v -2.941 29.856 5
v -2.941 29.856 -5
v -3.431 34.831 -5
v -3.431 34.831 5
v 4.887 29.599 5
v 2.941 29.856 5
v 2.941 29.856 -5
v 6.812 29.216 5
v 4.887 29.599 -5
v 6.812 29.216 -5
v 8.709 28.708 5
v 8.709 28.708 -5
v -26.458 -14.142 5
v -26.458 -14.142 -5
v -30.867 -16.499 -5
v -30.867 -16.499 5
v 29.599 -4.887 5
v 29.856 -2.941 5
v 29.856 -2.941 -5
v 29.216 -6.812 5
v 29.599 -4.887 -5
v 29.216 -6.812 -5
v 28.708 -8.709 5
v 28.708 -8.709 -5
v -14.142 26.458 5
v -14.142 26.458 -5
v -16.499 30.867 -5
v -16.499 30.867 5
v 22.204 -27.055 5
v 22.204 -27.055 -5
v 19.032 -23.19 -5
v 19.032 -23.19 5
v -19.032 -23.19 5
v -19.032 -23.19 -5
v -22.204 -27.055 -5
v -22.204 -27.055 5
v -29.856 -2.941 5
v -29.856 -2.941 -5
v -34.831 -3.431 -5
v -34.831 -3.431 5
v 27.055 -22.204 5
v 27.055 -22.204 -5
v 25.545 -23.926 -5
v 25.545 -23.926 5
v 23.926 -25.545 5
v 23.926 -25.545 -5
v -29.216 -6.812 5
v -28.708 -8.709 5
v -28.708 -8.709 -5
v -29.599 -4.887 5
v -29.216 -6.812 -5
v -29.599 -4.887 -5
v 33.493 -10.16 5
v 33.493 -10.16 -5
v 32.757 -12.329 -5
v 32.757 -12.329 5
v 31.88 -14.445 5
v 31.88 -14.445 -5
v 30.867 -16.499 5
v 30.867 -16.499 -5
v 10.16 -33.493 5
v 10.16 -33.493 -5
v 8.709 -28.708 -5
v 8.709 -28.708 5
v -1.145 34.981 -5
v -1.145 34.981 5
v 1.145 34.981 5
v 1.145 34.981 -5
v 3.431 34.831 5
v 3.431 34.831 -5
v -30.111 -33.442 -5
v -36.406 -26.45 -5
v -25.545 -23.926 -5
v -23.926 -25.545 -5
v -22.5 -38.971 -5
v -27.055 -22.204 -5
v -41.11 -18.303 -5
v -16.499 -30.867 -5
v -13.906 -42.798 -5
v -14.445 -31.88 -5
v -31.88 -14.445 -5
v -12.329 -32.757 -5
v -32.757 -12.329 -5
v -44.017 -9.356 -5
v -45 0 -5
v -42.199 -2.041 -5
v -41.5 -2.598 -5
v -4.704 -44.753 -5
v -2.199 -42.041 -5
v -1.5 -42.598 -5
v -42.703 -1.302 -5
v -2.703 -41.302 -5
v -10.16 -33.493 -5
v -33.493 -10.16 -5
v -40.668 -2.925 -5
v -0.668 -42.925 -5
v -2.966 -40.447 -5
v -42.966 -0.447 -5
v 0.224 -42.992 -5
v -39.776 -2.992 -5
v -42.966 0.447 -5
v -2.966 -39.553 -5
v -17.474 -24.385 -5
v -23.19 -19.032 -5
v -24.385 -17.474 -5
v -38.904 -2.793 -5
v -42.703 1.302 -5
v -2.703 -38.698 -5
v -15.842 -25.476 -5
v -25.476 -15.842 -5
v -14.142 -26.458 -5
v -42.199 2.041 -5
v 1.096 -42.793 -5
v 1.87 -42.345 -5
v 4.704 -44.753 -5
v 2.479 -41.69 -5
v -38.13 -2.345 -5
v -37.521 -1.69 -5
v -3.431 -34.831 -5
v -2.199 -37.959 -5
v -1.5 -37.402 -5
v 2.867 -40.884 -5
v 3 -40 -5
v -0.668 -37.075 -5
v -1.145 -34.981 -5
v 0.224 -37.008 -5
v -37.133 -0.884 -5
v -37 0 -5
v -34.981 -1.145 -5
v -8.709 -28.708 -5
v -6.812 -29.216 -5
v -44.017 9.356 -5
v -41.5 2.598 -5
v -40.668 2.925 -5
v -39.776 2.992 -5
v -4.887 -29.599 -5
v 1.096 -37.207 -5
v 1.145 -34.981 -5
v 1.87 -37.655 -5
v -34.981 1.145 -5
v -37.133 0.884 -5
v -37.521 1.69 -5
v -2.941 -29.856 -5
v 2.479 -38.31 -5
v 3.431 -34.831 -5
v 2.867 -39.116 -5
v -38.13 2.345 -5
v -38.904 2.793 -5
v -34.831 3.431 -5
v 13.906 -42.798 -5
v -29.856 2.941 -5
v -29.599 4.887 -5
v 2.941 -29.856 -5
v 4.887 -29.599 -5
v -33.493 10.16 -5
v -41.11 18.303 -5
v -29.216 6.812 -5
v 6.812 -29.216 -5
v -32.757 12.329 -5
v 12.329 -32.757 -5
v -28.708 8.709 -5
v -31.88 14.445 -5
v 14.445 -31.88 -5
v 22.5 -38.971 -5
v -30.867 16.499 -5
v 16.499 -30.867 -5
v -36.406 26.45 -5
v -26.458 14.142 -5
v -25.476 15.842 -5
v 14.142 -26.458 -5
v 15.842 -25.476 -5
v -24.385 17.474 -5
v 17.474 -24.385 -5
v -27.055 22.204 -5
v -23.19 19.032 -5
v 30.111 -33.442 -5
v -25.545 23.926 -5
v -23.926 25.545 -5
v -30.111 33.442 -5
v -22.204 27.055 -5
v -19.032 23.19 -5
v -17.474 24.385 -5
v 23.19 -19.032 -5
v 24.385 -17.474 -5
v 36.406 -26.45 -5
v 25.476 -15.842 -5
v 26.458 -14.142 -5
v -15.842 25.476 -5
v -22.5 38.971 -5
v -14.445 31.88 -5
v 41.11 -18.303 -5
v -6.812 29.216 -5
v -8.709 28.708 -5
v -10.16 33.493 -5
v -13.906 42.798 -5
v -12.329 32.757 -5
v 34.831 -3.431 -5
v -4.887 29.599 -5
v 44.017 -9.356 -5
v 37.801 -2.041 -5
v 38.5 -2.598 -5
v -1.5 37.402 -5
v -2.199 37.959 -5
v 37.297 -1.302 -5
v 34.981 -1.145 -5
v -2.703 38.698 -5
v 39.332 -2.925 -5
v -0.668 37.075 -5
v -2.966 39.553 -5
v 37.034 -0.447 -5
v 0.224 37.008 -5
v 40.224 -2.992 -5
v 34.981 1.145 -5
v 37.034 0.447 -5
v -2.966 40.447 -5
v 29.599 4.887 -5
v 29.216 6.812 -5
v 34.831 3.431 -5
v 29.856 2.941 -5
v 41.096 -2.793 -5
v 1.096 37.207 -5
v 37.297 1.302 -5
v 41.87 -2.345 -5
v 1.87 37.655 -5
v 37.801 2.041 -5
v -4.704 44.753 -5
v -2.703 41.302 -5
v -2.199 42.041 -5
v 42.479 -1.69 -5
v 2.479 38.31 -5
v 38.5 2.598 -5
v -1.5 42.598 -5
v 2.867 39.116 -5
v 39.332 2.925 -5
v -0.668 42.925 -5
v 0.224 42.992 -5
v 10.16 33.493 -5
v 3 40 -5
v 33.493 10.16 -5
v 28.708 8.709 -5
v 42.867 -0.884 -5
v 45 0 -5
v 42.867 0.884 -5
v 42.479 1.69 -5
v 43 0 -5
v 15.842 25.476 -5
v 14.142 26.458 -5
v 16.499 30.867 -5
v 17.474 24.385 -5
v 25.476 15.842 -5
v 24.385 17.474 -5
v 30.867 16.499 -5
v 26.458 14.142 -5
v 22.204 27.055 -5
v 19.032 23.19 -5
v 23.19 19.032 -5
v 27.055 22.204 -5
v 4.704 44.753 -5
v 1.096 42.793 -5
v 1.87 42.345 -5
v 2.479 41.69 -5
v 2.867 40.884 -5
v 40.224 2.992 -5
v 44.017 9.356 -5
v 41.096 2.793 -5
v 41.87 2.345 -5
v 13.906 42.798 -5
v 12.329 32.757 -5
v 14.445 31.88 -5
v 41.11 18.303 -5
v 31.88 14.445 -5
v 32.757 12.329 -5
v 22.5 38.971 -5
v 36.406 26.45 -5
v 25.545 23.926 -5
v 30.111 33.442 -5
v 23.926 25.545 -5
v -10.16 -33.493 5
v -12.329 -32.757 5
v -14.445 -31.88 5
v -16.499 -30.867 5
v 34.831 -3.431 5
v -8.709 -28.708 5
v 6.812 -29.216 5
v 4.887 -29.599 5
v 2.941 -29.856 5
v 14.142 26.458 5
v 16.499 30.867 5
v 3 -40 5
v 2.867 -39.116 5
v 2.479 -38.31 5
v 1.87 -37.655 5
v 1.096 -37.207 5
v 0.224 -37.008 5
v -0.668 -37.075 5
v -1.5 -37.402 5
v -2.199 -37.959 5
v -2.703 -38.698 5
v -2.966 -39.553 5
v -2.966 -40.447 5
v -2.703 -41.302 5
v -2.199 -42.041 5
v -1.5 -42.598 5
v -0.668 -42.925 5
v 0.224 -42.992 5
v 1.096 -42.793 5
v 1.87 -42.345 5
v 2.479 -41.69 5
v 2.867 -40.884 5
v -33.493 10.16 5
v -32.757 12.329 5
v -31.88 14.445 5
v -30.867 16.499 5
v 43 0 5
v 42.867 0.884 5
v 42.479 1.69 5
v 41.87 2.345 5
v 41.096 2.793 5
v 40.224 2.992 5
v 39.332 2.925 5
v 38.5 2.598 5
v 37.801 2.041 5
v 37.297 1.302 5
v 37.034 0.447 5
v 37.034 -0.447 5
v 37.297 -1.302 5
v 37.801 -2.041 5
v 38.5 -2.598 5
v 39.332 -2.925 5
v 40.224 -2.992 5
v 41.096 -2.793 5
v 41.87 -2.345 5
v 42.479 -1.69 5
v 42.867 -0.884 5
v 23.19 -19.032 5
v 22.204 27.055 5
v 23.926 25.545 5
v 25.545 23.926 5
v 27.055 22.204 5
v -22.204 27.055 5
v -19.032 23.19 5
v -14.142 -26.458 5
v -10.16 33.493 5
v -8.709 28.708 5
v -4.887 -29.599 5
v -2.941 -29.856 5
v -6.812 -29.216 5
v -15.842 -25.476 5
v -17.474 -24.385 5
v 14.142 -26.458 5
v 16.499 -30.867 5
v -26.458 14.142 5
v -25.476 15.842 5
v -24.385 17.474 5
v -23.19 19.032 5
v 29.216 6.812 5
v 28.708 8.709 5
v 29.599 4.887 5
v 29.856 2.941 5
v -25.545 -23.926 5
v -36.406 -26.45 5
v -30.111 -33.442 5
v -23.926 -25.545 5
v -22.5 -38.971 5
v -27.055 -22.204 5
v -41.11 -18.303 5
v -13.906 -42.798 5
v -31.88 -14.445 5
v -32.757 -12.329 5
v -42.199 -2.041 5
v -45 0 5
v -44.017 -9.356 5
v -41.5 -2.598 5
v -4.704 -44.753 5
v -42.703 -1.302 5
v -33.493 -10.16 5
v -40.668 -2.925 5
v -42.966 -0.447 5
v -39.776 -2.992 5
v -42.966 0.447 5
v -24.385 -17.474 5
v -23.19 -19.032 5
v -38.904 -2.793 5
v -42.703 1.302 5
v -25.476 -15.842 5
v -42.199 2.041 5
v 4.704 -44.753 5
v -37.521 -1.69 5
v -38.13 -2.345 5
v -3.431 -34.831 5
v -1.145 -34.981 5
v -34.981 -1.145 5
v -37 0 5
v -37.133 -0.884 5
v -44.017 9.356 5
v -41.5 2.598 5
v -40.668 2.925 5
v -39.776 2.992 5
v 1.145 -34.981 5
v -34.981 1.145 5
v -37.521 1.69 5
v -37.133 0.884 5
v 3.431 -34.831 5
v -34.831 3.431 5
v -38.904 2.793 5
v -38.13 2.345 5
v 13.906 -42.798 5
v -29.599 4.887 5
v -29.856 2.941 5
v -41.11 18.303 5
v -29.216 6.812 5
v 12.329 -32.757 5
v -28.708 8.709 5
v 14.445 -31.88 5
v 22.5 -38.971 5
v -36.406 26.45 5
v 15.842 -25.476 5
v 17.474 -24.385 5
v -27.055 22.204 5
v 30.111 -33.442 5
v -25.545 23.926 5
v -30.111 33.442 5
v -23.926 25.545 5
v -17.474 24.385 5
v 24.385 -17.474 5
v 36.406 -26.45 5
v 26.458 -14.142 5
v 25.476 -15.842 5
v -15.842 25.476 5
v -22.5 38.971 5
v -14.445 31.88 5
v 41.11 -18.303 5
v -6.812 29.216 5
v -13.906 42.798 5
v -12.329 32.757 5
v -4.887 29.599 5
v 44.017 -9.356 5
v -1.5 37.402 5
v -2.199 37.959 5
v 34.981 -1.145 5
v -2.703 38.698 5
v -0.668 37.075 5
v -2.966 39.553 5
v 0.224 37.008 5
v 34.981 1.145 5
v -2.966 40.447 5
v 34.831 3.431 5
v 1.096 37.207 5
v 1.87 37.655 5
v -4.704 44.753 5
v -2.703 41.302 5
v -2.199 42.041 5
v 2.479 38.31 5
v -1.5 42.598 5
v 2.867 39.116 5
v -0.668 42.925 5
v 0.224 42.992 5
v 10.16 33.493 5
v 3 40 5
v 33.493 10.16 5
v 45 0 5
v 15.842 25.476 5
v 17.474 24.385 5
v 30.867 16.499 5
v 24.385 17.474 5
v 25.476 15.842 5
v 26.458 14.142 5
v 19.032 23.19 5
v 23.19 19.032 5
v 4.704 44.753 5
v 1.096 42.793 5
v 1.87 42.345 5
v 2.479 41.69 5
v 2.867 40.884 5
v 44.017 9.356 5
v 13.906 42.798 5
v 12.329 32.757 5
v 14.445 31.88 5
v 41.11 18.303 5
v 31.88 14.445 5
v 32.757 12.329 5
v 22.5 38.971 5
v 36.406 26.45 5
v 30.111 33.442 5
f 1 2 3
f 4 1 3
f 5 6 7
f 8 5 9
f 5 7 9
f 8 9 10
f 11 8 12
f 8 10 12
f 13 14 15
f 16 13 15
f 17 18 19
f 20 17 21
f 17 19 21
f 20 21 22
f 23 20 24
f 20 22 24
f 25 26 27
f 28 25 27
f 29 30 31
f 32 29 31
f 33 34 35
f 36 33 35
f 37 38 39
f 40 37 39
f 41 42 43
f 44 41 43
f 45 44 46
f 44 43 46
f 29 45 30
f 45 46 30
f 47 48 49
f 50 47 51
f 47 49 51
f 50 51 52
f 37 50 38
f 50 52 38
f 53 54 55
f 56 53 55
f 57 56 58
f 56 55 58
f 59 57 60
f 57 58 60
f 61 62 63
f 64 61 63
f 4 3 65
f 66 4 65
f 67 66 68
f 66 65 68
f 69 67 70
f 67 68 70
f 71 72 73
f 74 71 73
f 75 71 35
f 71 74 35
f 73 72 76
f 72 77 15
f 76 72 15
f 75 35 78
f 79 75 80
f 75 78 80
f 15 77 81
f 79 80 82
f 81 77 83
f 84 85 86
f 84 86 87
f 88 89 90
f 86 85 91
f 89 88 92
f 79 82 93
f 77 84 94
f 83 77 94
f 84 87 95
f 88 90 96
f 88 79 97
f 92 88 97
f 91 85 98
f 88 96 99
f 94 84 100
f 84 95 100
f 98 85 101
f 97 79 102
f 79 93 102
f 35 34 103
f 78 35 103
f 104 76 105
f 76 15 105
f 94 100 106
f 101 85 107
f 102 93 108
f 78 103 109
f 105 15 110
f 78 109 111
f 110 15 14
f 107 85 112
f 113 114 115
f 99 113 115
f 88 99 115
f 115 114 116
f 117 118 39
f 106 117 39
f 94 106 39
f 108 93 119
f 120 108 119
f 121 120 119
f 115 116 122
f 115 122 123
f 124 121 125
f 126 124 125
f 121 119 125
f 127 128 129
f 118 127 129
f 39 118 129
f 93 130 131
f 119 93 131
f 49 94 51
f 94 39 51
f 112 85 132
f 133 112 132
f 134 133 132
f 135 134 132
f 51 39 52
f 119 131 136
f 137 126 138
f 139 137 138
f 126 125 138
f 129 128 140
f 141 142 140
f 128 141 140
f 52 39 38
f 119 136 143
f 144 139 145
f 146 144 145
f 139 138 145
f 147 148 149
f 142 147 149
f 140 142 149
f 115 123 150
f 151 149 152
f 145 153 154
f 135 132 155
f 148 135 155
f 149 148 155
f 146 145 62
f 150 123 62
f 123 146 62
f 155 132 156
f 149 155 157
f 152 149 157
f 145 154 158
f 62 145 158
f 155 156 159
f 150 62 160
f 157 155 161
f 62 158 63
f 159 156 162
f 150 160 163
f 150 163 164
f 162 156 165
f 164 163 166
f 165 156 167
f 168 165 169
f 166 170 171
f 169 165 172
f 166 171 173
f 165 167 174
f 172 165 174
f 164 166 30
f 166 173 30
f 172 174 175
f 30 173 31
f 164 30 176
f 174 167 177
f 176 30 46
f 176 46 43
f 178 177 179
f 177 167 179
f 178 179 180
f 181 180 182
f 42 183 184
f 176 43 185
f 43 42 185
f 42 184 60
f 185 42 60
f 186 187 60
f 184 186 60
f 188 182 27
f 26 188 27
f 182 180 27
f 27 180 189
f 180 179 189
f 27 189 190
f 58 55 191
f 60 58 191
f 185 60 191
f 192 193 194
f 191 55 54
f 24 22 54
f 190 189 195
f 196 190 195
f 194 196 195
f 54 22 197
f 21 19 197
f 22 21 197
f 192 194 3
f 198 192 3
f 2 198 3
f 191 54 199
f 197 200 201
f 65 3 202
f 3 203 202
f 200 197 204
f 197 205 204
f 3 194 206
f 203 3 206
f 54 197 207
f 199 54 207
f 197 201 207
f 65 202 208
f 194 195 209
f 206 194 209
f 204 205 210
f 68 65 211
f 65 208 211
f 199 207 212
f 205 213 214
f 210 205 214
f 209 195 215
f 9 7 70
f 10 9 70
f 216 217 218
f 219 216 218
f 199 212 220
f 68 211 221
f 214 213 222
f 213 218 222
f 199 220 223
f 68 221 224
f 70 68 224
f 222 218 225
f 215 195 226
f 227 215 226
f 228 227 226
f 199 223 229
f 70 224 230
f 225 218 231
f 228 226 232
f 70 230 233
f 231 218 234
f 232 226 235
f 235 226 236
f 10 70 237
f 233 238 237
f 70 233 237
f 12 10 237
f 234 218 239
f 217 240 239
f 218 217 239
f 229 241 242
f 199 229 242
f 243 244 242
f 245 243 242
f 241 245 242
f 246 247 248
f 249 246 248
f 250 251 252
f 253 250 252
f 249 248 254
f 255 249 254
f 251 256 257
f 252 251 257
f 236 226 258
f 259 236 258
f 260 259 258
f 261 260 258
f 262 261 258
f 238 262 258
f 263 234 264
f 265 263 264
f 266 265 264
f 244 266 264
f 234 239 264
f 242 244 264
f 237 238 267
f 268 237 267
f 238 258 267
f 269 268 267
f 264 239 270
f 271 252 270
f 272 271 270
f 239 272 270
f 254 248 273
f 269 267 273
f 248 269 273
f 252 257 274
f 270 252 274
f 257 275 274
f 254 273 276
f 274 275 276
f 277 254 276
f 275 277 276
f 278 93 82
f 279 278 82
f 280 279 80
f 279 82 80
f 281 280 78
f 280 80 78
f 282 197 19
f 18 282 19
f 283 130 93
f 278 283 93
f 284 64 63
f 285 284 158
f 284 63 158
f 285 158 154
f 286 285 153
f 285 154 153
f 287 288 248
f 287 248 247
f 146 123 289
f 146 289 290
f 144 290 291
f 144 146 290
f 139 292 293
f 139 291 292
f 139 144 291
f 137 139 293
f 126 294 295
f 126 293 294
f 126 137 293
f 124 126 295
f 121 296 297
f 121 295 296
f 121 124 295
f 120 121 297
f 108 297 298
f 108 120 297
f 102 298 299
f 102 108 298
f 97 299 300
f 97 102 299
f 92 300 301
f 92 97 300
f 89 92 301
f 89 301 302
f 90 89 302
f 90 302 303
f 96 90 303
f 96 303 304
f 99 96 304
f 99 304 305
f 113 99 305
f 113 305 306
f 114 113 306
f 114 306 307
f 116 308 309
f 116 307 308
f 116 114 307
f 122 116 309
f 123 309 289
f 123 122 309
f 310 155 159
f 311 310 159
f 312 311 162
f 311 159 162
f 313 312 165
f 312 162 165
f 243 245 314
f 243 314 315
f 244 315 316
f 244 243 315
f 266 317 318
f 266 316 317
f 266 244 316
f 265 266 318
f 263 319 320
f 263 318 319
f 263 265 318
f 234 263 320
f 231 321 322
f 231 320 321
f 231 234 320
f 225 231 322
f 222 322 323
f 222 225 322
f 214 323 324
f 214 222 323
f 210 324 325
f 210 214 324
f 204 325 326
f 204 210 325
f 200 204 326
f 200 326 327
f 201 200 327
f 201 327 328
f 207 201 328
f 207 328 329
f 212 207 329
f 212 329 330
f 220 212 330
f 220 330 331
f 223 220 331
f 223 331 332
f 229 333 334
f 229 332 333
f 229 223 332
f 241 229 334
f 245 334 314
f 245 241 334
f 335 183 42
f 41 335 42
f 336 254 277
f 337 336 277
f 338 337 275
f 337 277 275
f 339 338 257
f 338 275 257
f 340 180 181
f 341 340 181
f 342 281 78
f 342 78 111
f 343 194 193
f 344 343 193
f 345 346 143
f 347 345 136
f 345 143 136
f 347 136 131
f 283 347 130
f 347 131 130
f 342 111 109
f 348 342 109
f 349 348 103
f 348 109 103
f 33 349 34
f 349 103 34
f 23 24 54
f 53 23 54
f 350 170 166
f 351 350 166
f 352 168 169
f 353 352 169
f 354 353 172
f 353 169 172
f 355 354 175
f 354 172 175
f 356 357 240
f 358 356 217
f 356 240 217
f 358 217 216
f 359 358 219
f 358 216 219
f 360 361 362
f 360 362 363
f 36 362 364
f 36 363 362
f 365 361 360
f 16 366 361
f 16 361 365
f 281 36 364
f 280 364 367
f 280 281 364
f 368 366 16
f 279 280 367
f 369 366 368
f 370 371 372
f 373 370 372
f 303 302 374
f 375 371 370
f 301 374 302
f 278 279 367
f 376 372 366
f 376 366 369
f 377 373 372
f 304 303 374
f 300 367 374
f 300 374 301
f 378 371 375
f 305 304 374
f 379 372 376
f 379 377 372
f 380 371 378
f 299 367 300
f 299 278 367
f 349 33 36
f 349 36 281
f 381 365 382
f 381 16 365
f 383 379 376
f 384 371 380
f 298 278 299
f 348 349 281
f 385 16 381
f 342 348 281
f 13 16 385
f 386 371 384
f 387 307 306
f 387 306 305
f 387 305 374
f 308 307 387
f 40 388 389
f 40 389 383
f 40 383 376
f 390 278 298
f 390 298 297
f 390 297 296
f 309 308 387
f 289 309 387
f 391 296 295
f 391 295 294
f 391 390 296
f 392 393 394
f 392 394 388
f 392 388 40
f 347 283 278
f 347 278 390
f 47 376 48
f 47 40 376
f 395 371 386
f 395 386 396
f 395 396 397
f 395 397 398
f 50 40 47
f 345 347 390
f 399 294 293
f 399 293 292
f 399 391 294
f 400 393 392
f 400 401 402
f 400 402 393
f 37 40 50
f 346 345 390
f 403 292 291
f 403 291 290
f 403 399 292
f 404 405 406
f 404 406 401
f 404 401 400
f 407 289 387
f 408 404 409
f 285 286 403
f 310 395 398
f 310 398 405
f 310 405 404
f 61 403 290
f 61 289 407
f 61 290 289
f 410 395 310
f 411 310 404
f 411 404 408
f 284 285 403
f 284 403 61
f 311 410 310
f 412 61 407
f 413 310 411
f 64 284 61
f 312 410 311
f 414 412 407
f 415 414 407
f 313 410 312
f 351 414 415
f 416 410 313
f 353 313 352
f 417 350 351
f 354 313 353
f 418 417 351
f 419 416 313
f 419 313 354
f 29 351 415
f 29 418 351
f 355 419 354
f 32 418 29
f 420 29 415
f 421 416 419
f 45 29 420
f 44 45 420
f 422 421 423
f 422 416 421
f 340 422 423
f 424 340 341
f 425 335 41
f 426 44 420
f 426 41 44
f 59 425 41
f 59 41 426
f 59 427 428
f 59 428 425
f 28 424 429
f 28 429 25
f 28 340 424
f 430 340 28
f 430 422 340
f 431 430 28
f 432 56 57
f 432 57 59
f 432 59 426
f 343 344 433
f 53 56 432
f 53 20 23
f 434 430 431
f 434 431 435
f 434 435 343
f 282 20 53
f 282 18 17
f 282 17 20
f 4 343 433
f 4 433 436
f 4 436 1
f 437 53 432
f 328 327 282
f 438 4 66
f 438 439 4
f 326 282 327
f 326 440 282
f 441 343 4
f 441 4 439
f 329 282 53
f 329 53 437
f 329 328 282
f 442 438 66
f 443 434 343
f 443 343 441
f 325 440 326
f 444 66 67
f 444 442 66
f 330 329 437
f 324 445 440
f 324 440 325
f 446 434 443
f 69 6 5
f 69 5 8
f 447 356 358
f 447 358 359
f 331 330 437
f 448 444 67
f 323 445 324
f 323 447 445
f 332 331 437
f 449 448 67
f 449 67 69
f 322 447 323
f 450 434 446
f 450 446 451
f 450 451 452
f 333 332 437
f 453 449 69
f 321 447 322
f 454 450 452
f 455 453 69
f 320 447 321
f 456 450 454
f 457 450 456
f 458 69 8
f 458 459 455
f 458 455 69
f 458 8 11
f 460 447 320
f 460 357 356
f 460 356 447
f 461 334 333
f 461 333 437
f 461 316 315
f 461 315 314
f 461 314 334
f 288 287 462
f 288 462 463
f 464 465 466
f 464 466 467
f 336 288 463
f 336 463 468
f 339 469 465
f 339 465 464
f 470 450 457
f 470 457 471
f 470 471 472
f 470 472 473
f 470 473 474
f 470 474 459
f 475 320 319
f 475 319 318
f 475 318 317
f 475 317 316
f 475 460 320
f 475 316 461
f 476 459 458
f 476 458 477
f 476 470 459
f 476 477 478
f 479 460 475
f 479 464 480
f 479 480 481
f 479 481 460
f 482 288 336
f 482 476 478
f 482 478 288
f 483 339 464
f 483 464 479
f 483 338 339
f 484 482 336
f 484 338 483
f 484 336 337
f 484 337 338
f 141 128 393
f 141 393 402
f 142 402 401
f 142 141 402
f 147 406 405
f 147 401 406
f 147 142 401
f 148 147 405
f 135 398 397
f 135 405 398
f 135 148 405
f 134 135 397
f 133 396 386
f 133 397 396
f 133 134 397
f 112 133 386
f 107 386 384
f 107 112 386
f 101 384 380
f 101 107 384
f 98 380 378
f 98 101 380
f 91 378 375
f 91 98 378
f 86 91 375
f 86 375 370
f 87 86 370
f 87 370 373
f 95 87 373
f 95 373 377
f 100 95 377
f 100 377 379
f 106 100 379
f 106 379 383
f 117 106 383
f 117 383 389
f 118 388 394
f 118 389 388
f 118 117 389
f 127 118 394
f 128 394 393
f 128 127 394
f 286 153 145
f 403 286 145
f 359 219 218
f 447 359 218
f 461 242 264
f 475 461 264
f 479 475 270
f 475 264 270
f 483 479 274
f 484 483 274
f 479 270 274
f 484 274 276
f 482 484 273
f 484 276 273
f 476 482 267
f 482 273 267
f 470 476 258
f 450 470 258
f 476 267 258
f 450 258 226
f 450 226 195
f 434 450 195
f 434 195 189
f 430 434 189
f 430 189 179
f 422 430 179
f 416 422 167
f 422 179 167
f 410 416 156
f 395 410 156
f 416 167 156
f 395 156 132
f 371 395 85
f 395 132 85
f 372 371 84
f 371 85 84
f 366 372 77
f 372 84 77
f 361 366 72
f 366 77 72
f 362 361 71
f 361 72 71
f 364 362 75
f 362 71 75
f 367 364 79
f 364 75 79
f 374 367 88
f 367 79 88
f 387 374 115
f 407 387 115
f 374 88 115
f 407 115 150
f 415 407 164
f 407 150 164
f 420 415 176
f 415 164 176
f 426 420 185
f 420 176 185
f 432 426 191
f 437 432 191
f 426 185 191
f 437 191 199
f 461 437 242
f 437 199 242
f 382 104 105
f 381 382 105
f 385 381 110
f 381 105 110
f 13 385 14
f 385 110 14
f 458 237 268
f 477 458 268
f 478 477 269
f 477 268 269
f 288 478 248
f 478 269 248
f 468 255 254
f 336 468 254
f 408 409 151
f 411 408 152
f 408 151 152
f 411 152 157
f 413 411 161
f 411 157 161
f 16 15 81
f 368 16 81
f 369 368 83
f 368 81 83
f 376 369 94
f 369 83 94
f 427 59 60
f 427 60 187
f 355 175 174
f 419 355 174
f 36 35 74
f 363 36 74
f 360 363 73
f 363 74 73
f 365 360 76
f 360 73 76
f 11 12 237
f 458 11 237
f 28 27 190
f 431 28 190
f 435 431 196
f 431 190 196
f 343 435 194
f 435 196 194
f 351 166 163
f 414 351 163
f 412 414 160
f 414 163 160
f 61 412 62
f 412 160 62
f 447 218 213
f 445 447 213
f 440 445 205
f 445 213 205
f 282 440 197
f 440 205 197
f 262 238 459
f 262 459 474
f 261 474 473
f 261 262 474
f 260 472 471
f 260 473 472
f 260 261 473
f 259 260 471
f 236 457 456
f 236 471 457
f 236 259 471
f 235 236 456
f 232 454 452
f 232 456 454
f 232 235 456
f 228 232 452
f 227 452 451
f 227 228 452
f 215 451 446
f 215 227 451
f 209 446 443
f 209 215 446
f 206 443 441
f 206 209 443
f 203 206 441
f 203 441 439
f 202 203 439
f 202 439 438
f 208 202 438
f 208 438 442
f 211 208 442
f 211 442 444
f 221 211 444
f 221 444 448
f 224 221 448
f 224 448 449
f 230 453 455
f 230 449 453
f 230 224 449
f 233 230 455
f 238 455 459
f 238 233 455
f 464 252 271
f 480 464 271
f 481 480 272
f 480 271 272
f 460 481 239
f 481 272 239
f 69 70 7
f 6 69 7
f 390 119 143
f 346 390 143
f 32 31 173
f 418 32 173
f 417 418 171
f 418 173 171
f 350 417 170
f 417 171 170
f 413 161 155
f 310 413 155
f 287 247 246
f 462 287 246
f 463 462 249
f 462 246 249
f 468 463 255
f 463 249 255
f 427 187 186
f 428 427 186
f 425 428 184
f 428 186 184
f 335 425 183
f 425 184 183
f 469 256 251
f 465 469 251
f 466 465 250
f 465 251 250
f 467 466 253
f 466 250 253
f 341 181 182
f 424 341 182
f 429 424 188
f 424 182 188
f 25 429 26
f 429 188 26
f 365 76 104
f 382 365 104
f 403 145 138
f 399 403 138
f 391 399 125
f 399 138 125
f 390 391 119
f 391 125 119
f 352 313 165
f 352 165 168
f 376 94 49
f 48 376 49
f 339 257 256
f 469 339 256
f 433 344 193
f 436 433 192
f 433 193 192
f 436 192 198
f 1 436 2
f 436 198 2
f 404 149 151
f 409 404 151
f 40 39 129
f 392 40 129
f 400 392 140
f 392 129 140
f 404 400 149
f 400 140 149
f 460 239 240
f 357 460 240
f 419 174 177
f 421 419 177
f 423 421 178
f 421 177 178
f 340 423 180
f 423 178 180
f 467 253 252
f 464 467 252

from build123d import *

# Parameters (mm, degrees)
EXTRUDE_1_DEPTH          = 5
EXTRUDE_1_DEPTH_BACK     = 5
SKETCH_1_R               = 45
CUT_EXTRUDE_1_DEPTH      = 64.835726674
CUT_EXTRUDE_1_DEPTH_BACK = 64.835726674
SKETCH_2_R               = 3


with BuildPart() as part:
    # 草图1 → 凸台-拉伸1 (new, two sides: drawn at the far end of the back side and taken through both)
    with BuildSketch(Plane.XY.offset(-EXTRUDE_1_DEPTH_BACK)):
        Circle(SKETCH_1_R)
        with BuildLine():
            Line((29.8555418, 2.94051421), (34.831465434, 3.430599912))
            ThreePointArc((34.831465434, 3.430599912), (35, 0), (34.831465434, -3.430599912))
            Line((34.831465434, -3.430599912), (29.8555418, -2.94051421))
            ThreePointArc((29.8555418, -2.94051421), (29.423558412, -5.85270966), (28.708210072, -8.708540318))
            Line((28.708210072, -8.708540318), (33.492911751, -10.159963704))
            ThreePointArc((33.492911751, -10.159963704), (32.335783638, -13.393920133), (30.867244252, -16.498885789))
            Line((30.867244252, -16.498885789), (26.45763793, -14.141902105))
            ThreePointArc((26.45763793, -14.141902105), (24.944088369, -16.667106991), (23.190313601, -19.031798525))
            Line((23.190313601, -19.031798525), (27.055365868, -22.203764946))
            ThreePointArc((27.055365868, -22.203764946), (24.748737342, -24.748737342), (22.203764946, -27.055365868))
            Line((22.203764946, -27.055365868), (19.031798525, -23.190313601))
            ThreePointArc((19.031798525, -23.190313601), (16.667106991, -24.944088369), (14.141902105, -26.45763793))
            Line((14.141902105, -26.45763793), (16.498885789, -30.867244252))
            ThreePointArc((16.498885789, -30.867244252), (13.393920133, -32.335783638), (10.159963704, -33.492911751))
            Line((10.159963704, -33.492911751), (8.708540318, -28.708210072))
            ThreePointArc((8.708540318, -28.708210072), (5.85270966, -29.423558412), (2.94051421, -29.8555418))
            Line((2.94051421, -29.8555418), (3.430599912, -34.831465434))
            ThreePointArc((3.430599912, -34.831465434), (0, -35), (-3.430599912, -34.831465434))
            Line((-3.430599912, -34.831465434), (-2.94051421, -29.8555418))
            ThreePointArc((-2.94051421, -29.8555418), (-5.85270966, -29.423558412), (-8.708540318, -28.708210072))
            Line((-8.708540318, -28.708210072), (-10.159963704, -33.492911751))
            ThreePointArc((-10.159963704, -33.492911751), (-13.393920133, -32.335783638), (-16.498885789, -30.867244252))
            Line((-16.498885789, -30.867244252), (-14.141902105, -26.45763793))
            ThreePointArc((-14.141902105, -26.45763793), (-16.667106991, -24.944088369), (-19.031798525, -23.190313601))
            Line((-19.031798525, -23.190313601), (-22.203764946, -27.055365868))
            ThreePointArc((-22.203764946, -27.055365868), (-24.748737342, -24.748737342), (-27.055365868, -22.203764946))
            Line((-27.055365868, -22.203764946), (-23.190313601, -19.031798525))
            ThreePointArc((-23.190313601, -19.031798525), (-24.944088369, -16.667106991), (-26.45763793, -14.141902105))
            Line((-26.45763793, -14.141902105), (-30.867244252, -16.498885789))
            ThreePointArc((-30.867244252, -16.498885789), (-32.335783638, -13.393920133), (-33.492911751, -10.159963704))
            Line((-33.492911751, -10.159963704), (-28.708210072, -8.708540318))
            ThreePointArc((-28.708210072, -8.708540318), (-29.423558412, -5.85270966), (-29.8555418, -2.94051421))
            Line((-29.8555418, -2.94051421), (-34.831465434, -3.430599912))
            ThreePointArc((-34.831465434, -3.430599912), (-35, 0), (-34.831465434, 3.430599912))
            Line((-34.831465434, 3.430599912), (-29.8555418, 2.94051421))
            ThreePointArc((-29.8555418, 2.94051421), (-29.423558412, 5.85270966), (-28.708210072, 8.708540318))
            Line((-28.708210072, 8.708540318), (-33.492911751, 10.159963704))
            ThreePointArc((-33.492911751, 10.159963704), (-32.335783638, 13.393920133), (-30.867244252, 16.498885789))
            Line((-30.867244252, 16.498885789), (-26.45763793, 14.141902105))
            ThreePointArc((-26.45763793, 14.141902105), (-24.944088369, 16.667106991), (-23.190313601, 19.031798525))
            Line((-23.190313601, 19.031798525), (-27.055365868, 22.203764946))
            ThreePointArc((-27.055365868, 22.203764946), (-24.748737342, 24.748737342), (-22.203764946, 27.055365868))
            Line((-22.203764946, 27.055365868), (-19.031798525, 23.190313601))
            ThreePointArc((-19.031798525, 23.190313601), (-16.667106991, 24.944088369), (-14.141902105, 26.45763793))
            Line((-14.141902105, 26.45763793), (-16.498885789, 30.867244252))
            ThreePointArc((-16.498885789, 30.867244252), (-13.393920133, 32.335783638), (-10.159963704, 33.492911751))
            Line((-10.159963704, 33.492911751), (-8.708540318, 28.708210072))
            ThreePointArc((-8.708540318, 28.708210072), (-5.85270966, 29.423558412), (-2.94051421, 29.8555418))
            Line((-2.94051421, 29.8555418), (-3.430599912, 34.831465434))
            ThreePointArc((-3.430599912, 34.831465434), (0, 35), (3.430599912, 34.831465434))
            Line((3.430599912, 34.831465434), (2.94051421, 29.8555418))
            ThreePointArc((2.94051421, 29.8555418), (5.85270966, 29.423558412), (8.708540318, 28.708210072))
            Line((8.708540318, 28.708210072), (10.159963704, 33.492911751))
            ThreePointArc((10.159963704, 33.492911751), (13.393920133, 32.335783638), (16.498885789, 30.867244252))
            Line((16.498885789, 30.867244252), (14.141902105, 26.45763793))
            ThreePointArc((14.141902105, 26.45763793), (16.667106991, 24.944088369), (19.031798525, 23.190313601))
            Line((19.031798525, 23.190313601), (22.203764946, 27.055365868))
            ThreePointArc((22.203764946, 27.055365868), (24.748737342, 24.748737342), (27.055365868, 22.203764946))
            Line((27.055365868, 22.203764946), (23.190313601, 19.031798525))
            ThreePointArc((23.190313601, 19.031798525), (24.944088369, 16.667106991), (26.45763793, 14.141902105))
            Line((26.45763793, 14.141902105), (30.867244252, 16.498885789))
            ThreePointArc((30.867244252, 16.498885789), (32.335783638, 13.393920133), (33.492911751, 10.159963704))
            Line((33.492911751, 10.159963704), (28.708210072, 8.708540318))
            ThreePointArc((28.708210072, 8.708540318), (29.423558412, 5.85270966), (29.8555418, 2.94051421))
        make_face(mode=Mode.SUBTRACT)
    extrude(amount=EXTRUDE_1_DEPTH + EXTRUDE_1_DEPTH_BACK)

    # 草图2 → 切除-拉伸1 (cut, two sides: drawn at the far end of the back side and taken through both)
    with BuildSketch(Plane.XY.offset(-CUT_EXTRUDE_1_DEPTH_BACK)):
        with Locations((40, 0)):
            Circle(SKETCH_2_R)
        with Locations((0, -40)):
            Circle(SKETCH_2_R)
        with Locations((-40, 0)):
            Circle(SKETCH_2_R)
        with Locations((0, 40)):
            Circle(SKETCH_2_R)
    extrude(amount=CUT_EXTRUDE_1_DEPTH + CUT_EXTRUDE_1_DEPTH_BACK, mode=Mode.SUBTRACT)


solid = part.part
